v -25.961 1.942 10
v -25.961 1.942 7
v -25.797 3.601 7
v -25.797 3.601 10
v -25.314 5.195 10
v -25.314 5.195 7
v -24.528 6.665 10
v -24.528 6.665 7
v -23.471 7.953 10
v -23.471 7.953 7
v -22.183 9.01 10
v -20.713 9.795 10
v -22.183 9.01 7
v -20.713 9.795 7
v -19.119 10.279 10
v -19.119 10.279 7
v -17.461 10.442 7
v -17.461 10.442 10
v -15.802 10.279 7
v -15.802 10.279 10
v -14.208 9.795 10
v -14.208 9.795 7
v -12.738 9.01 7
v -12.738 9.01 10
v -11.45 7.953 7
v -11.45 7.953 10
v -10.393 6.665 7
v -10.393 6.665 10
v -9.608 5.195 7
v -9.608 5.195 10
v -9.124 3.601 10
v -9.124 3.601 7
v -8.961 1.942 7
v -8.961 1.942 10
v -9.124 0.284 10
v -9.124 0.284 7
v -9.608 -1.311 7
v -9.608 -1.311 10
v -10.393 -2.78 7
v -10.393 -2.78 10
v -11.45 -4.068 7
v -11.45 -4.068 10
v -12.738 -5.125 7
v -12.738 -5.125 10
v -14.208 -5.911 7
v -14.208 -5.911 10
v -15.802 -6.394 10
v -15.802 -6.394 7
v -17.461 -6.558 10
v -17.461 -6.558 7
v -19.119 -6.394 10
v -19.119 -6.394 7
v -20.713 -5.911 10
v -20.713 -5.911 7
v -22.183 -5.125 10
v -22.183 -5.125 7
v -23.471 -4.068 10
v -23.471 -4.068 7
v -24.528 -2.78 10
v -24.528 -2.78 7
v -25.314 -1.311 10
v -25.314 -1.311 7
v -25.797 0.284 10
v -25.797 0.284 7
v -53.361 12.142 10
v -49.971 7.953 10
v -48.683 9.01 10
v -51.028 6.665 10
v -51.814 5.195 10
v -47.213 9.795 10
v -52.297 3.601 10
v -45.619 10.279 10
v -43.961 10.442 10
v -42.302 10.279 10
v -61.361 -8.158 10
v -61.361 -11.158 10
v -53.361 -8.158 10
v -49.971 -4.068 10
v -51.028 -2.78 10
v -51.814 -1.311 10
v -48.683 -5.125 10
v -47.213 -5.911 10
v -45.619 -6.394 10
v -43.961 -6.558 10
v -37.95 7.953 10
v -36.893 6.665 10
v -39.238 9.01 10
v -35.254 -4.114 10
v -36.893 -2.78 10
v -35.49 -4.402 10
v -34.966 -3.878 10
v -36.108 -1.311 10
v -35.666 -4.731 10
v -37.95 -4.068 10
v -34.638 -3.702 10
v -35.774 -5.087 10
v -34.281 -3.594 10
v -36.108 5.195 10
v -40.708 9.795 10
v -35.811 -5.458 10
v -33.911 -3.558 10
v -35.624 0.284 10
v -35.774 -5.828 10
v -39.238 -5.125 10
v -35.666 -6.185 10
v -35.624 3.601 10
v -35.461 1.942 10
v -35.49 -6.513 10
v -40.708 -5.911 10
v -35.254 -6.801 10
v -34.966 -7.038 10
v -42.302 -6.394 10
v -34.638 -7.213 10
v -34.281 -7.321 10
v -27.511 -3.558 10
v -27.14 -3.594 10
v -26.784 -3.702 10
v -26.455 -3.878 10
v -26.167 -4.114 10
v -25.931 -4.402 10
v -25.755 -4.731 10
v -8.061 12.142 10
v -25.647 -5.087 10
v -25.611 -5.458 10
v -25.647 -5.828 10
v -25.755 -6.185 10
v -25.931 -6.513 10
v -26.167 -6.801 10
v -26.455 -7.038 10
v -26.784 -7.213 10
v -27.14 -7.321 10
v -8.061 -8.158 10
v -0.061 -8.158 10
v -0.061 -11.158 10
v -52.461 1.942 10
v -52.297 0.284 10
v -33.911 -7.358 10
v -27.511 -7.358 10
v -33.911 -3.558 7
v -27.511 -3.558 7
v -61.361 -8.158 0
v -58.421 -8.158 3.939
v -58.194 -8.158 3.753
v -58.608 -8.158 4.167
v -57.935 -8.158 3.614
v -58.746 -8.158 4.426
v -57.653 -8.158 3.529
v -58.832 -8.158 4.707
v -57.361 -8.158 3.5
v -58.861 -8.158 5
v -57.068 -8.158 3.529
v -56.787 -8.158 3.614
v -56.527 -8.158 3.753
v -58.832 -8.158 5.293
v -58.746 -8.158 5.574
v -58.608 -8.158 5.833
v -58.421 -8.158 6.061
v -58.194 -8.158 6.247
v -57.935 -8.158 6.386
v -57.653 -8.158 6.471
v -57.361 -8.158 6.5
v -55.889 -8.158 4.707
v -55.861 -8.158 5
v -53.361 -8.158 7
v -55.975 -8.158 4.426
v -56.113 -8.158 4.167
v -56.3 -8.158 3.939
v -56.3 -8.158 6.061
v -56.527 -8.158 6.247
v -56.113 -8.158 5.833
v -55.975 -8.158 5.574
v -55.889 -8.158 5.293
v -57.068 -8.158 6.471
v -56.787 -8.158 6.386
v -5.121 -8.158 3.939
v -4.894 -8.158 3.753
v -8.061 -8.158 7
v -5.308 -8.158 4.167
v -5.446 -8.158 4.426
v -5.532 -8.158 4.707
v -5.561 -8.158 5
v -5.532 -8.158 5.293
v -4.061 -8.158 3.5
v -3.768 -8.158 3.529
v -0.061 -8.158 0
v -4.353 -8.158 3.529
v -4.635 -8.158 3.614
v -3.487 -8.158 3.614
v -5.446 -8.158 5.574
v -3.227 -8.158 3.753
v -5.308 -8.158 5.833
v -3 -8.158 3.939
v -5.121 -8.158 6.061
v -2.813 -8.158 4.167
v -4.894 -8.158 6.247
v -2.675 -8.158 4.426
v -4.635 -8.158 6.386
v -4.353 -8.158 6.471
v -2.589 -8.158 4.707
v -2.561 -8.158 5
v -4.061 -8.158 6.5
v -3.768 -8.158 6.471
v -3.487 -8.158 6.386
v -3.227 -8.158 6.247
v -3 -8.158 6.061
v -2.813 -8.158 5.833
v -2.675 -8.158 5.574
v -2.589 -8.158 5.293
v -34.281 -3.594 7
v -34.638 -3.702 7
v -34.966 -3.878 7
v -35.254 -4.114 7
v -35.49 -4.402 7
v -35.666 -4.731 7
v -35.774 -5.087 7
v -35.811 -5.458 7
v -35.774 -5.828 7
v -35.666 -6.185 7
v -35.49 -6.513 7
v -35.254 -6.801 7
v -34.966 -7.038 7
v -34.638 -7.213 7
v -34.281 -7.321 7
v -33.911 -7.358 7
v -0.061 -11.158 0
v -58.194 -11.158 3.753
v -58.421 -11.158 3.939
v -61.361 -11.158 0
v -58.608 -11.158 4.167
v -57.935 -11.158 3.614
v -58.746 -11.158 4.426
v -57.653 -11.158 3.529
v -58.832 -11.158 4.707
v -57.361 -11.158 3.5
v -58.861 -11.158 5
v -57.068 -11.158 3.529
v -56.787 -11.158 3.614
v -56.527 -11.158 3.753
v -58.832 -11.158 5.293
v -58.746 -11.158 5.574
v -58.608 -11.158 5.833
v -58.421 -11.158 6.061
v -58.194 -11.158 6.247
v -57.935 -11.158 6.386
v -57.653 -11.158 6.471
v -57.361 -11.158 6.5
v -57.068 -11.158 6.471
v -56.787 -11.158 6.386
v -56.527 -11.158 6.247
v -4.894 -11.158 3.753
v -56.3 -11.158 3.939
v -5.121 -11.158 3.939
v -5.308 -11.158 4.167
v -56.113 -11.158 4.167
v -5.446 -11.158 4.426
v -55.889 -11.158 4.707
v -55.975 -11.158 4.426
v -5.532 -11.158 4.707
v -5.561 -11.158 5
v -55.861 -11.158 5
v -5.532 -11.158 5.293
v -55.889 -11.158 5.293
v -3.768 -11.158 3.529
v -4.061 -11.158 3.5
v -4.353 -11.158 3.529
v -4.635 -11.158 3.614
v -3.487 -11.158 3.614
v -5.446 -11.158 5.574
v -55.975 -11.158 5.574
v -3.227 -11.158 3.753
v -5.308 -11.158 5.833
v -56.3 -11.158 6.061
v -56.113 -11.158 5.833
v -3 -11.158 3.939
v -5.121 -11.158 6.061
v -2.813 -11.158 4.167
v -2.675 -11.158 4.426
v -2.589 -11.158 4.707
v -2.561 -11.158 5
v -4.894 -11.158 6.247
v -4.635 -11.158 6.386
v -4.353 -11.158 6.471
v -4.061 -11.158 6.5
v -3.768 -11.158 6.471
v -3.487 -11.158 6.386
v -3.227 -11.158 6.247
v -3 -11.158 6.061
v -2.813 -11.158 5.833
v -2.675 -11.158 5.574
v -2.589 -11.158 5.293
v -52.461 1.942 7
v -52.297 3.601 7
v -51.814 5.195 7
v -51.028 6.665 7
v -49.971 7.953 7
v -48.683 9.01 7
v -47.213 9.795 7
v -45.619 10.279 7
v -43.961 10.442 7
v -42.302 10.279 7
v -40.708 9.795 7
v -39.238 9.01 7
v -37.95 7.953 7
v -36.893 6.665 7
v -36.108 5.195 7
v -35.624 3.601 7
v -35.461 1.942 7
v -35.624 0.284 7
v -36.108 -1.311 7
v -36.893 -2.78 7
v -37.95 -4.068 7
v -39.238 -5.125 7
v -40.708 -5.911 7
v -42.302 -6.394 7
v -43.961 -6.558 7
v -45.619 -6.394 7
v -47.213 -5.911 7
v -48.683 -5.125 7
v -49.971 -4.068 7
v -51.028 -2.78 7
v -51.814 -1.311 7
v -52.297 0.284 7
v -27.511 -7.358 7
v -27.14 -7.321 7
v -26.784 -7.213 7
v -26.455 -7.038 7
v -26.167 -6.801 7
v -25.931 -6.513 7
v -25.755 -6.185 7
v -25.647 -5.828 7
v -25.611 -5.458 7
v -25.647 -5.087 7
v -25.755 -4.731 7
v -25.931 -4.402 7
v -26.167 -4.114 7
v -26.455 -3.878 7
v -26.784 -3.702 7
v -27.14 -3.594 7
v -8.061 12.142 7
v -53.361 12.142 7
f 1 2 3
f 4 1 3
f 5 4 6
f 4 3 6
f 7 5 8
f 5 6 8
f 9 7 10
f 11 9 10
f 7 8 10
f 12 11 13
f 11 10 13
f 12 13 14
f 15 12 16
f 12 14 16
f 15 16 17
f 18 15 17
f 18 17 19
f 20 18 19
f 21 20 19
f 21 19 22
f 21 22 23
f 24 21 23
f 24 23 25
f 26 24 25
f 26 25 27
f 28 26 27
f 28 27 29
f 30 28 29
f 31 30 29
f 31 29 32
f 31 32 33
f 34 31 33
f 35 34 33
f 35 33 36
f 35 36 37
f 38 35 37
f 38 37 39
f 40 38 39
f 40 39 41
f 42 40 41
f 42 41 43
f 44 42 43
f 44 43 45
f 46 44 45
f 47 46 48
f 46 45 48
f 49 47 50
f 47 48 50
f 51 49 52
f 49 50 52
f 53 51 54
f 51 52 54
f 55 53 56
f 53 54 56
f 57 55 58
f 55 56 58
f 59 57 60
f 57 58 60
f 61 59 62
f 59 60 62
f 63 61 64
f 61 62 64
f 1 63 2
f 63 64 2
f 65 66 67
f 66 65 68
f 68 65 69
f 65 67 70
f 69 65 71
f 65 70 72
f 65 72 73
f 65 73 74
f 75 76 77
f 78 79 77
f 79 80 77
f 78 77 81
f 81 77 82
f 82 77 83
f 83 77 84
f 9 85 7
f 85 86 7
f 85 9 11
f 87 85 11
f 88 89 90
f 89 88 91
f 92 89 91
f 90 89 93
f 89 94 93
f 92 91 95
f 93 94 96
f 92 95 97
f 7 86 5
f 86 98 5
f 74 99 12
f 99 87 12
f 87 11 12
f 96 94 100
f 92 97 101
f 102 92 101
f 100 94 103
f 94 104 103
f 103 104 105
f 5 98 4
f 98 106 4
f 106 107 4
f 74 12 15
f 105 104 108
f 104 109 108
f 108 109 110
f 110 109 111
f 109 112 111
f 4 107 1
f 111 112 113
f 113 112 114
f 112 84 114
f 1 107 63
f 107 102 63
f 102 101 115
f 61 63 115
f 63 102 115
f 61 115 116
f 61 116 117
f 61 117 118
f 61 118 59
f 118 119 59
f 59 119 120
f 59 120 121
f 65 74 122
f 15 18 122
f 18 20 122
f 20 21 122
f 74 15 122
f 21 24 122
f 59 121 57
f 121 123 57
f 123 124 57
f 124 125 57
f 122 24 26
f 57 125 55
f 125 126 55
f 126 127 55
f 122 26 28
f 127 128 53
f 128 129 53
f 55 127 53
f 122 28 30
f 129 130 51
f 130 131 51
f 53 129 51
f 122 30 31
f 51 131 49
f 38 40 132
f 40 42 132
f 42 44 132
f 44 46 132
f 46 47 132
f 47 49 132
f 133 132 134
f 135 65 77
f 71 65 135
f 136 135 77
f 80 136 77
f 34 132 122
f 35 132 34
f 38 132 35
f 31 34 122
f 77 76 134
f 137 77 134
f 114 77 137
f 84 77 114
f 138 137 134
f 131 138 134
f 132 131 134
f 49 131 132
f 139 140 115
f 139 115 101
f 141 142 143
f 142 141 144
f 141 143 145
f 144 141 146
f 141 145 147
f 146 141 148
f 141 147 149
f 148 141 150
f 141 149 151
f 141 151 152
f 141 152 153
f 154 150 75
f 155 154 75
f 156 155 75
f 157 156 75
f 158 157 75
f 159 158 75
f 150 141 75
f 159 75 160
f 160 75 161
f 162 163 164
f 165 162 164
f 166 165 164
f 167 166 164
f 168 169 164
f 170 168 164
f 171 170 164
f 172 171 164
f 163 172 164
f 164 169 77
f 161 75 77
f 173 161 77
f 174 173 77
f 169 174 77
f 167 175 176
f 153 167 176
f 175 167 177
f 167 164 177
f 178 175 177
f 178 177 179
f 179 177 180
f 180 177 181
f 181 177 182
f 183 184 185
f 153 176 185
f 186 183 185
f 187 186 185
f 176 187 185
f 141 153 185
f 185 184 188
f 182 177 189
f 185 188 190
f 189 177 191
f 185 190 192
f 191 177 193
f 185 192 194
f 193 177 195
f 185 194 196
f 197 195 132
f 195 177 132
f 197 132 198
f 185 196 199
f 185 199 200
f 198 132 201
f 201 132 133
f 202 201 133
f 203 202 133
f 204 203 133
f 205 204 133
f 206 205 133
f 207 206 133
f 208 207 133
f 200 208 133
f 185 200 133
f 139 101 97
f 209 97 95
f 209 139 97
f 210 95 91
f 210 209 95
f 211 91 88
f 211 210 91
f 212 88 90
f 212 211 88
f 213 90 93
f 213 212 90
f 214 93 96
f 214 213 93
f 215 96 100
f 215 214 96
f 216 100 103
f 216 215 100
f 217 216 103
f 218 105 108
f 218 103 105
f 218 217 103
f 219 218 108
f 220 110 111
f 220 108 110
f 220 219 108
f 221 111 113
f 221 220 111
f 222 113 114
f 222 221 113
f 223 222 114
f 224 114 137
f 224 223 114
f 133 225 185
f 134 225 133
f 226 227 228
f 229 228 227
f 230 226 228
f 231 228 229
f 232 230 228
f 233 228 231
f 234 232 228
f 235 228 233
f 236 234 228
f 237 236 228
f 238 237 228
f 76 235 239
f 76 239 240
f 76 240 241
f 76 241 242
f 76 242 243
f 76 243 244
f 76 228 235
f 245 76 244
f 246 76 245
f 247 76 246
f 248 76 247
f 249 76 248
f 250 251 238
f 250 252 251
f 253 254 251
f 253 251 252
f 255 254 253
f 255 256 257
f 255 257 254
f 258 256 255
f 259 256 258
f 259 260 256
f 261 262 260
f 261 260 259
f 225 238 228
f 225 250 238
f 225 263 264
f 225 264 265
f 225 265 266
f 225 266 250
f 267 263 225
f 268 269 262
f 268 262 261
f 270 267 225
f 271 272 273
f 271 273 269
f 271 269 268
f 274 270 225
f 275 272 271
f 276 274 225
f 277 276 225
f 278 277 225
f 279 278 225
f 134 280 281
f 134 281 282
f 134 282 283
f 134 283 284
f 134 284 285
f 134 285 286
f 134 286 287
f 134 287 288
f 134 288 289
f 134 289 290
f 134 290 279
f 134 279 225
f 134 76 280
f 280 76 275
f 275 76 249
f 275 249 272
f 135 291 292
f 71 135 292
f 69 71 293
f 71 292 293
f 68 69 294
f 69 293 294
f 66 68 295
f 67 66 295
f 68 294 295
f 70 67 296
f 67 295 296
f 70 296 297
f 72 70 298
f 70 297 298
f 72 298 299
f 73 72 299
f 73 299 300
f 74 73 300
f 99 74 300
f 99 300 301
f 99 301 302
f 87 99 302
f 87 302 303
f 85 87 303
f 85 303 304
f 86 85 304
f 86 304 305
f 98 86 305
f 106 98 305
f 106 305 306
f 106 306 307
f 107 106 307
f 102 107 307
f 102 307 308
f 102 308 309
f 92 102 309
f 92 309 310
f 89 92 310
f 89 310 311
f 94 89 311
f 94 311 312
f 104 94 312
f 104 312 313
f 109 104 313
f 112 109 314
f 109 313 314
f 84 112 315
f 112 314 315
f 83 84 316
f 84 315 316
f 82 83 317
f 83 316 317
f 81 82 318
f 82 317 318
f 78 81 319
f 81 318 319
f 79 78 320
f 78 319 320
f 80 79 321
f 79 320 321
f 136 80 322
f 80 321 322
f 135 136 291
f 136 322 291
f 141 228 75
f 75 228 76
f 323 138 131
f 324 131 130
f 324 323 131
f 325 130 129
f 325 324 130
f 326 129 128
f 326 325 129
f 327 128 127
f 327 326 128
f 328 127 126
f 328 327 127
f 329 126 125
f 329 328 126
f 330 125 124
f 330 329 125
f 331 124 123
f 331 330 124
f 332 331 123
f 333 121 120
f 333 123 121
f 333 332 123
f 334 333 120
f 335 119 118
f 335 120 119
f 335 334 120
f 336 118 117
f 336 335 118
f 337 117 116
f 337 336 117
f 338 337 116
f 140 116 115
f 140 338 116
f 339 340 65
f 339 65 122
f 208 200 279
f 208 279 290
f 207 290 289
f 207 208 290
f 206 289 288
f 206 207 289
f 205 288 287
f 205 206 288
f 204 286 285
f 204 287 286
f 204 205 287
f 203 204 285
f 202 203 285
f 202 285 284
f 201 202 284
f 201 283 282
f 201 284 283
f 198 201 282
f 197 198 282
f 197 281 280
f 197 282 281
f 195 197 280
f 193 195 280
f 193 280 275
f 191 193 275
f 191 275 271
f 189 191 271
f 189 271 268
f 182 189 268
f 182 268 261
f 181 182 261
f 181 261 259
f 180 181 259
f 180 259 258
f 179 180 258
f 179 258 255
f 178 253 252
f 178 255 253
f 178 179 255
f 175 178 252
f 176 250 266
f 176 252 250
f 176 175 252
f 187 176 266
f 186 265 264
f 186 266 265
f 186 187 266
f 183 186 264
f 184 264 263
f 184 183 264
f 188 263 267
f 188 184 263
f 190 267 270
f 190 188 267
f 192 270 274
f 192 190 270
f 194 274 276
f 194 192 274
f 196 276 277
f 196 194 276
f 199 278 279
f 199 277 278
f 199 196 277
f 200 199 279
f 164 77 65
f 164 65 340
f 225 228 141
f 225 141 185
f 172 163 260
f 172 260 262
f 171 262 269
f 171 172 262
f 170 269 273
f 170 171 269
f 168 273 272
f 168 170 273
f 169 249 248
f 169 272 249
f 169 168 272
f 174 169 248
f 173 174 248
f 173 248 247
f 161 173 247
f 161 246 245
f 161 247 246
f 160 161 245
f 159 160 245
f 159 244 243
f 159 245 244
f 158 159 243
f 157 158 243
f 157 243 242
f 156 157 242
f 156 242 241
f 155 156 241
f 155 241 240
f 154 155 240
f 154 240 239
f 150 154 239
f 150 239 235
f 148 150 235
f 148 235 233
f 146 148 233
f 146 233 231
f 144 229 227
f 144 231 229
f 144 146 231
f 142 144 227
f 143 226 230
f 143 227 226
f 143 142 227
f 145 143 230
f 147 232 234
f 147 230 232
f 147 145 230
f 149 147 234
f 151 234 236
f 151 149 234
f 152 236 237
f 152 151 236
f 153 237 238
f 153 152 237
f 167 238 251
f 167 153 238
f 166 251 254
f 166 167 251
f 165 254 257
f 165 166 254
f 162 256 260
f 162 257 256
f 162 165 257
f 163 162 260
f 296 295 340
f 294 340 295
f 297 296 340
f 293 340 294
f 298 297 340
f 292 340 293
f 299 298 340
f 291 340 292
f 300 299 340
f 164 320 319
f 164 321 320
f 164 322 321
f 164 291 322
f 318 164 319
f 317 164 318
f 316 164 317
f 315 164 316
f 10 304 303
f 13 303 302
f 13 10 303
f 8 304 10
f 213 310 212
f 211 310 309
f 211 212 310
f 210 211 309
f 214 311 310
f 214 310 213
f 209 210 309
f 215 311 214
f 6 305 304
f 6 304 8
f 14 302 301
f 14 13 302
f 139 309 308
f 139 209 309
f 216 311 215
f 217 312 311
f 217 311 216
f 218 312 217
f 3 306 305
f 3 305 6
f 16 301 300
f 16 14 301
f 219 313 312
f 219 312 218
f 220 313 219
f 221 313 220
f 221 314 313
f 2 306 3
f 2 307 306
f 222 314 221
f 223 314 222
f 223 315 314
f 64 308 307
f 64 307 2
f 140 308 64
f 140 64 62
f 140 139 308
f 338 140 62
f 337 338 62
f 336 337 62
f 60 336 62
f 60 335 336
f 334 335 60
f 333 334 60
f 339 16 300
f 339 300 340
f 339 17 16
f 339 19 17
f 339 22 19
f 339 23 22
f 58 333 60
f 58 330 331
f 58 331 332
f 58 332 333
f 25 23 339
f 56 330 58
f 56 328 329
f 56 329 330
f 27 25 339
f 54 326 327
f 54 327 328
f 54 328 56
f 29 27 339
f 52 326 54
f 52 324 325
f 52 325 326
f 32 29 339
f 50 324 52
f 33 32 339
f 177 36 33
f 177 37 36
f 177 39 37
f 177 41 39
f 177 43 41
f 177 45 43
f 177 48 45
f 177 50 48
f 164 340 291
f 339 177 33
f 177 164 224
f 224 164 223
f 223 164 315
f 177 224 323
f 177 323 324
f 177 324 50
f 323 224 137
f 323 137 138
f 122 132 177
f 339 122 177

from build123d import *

# Parameters (mm, degrees)
SKETCH1_W               = 170
SKETCH1_H               = 3
BOSS_EXTRUDE1_DEPTH     = 10
SKETCH4_R               = 1.2
CUT_EXTRUDE1_DEPTH      = 21
SKETCH2_W               = 45.3
SKETCH2_H               = 3
BOSS_EXTRUDE6_DEPTH     = 20.3
SKETCH5_R               = 8.5
CUT_EXTRUDE2_DEPTH      = 20.3
SKETCH6_W               = 45.3
SKETCH6_H               = 3
BOSS_EXTRUDE7_DEPTH     = 20.3
SKETCH7_R               = 8.5
CUT_EXTRUDE3_DEPTH      = 100.885733504
CUT_EXTRUDE5_DEPTH      = 102.201856693
CUT_EXTRUDE5_DEPTH_BACK = 102.201856693
SKETCH12_W              = 88.7
SKETCH12_H              = 17.241657791
CUT_EXTRUDE6_DEPTH      = 75.862735481
CUT_EXTRUDE6_DEPTH_BACK = 75.862735481
SKETCH13_W              = 37.135878318
SKETCH13_H              = 38.462159687
SKETCH13_W_2            = 38.462159687
SKETCH13_H_2            = 47.746129266
SKETCH15_W              = 8
SKETCH15_H              = 10
BOSS_EXTRUDE9_DEPTH     = 3
CUT_EXTRUDE7_DEPTH      = 67.392895801
CUT_EXTRUDE7_DEPTH_BACK = 67.392895801
SKETCH16_R              = 1.5


with BuildPart() as part:
    # Sketch1 → Boss-Extrude1 (new body)
    with BuildSketch(Plane.XY):
        with Locations((13.639372454, -9.657761352)):
            Rectangle(SKETCH1_W, SKETCH1_H)
    extrude(amount=BOSS_EXTRUDE1_DEPTH)

    # Sketch4 → Cut-Extrude1 (cut)
    with BuildSketch(Plane(origin=(0, -8.157761352, 0), x_dir=(1, 0, 0), z_dir=(0, 1, 0))):
        with Locations(Location((-63.360627546, -4.938536908, 0), (0, 0, 180))):
            Circle(SKETCH4_R)
        with Locations(Location((90.639372454, -5.283238547, 0), (0, 0, 180))):
            Circle(SKETCH4_R)
    extrude(amount=-CUT_EXTRUDE1_DEPTH, mode=Mode.SUBTRACT)

    # Sketch2 → Boss-Extrude6 (add)
    with BuildSketch(Plane(origin=(0, -8.157761352, 0), x_dir=(1, 0, 0), z_dir=(0, 1, 0))):
        with Locations((-30.710627546, -8.5)):
            Rectangle(SKETCH2_W, SKETCH2_H)
    extrude(amount=BOSS_EXTRUDE6_DEPTH)

    # Sketch5 → Cut-Extrude2 (cut)
    with BuildSketch(Plane(origin=(0, 0, 7), x_dir=(-1, 0, 0), z_dir=(0, 0, -1))):
        with Locations((17.460627546, 1.942238648)):
            Circle(SKETCH5_R)
        with Locations((43.960627546, 1.942238648)):
            Circle(SKETCH5_R)
        with BuildLine():
            Line((27.510627546, -3.557761352), (33.910627546, -3.557761352))
            ThreePointArc((33.910627546, -3.557761352), (35.810627546, -5.457761352), (33.910627546, -7.357761352))
            Line((33.910627546, -7.357761352), (27.510627546, -7.357761352))
            ThreePointArc((27.510627546, -7.357761352), (25.610627546, -5.457761352), (27.510627546, -3.557761352))
        make_face()
    extrude(amount=-CUT_EXTRUDE2_DEPTH, mode=Mode.SUBTRACT)

    # Sketch6 → Boss-Extrude7 (add)
    with BuildSketch(Plane(origin=(0, -8.157761352, 0), x_dir=(1, 0, 0), z_dir=(0, 1, 0))):
        with Locations((57.989372454, -8.5)):
            Rectangle(SKETCH6_W, SKETCH6_H)
    extrude(amount=BOSS_EXTRUDE7_DEPTH)

    # Sketch7 → Cut-Extrude3 (cut, through all)
    with BuildSketch(Plane.XY.offset(10)):
        with Locations((44.739372454, 1.942238648)):
            Circle(SKETCH7_R)
        with Locations((71.239372454, 1.942238648)):
            Circle(SKETCH7_R)
        with BuildLine():
            Line((54.839372454, -3.557761352), (61.239372454, -3.557761352))
            ThreePointArc((61.239372454, -3.557761352), (63.139372454, -5.457761352), (61.239372454, -7.357761352))
            Line((61.239372454, -7.357761352), (54.839372454, -7.357761352))
            ThreePointArc((54.839372454, -7.357761352), (52.939372454, -5.457761352), (54.839372454, -3.557761352))
        make_face()
    extrude(amount=-CUT_EXTRUDE3_DEPTH, mode=Mode.SUBTRACT)

    # Sketch12 → Cut-Extrude5 (cut, two sides: drawn at the far end of the back side and taken through both)
    with BuildSketch(Plane(origin=(0, -8.157761352, 0), x_dir=(1, 0, 0), z_dir=(0, 1, 0)).offset(-CUT_EXTRUDE5_DEPTH_BACK)):
        with Locations((54.289372454, -4.61843826)):
            Rectangle(SKETCH12_W, SKETCH12_H)
    extrude(amount=CUT_EXTRUDE5_DEPTH + CUT_EXTRUDE5_DEPTH_BACK, mode=Mode.SUBTRACT)

    # Sketch13 → Cut-Extrude6 (cut, two sides: drawn at the far end of the back side and taken through both)
    with BuildSketch(Plane(origin=(0, -8.157761352, 0), x_dir=(1, 0, 0), z_dir=(0, 1, 0)).offset(-CUT_EXTRUDE6_DEPTH_BACK)):
        with Locations((-71.928566705, 3.983905185)):
            Rectangle(SKETCH13_W, SKETCH13_H)
        with Locations((11.170452297, -17.070811541)):
            Rectangle(SKETCH13_W_2, SKETCH13_H_2)
    extrude(amount=CUT_EXTRUDE6_DEPTH + CUT_EXTRUDE6_DEPTH_BACK, mode=Mode.SUBTRACT)

    # Sketch15 → Boss-Extrude9 (add)
    with BuildSketch(Plane.XZ.offset(11.157761352)):
        with Locations((-57.360627546, 5)):
            Rectangle(SKETCH15_W, SKETCH15_H)
        with Locations((-4.060627546, 5)):
            Rectangle(SKETCH15_W, SKETCH15_H)
    extrude(amount=-BOSS_EXTRUDE9_DEPTH)

    # Sketch16 → Cut-Extrude7 (cut, two sides: drawn at the far end of the back side and taken through both)
    with BuildSketch(Plane(origin=(0, -11.157761352, 0), x_dir=(-1, 0, 0), z_dir=(0, -1, 0)).offset(-CUT_EXTRUDE7_DEPTH_BACK)):
        with Locations(Location((57.360627546, -5, 0), (0, 0, 180))):
            Circle(SKETCH16_R)
        with Locations(Location((4.060627546, -5, 0), (0, 0, 180))):
            Circle(SKETCH16_R)
    extrude(amount=CUT_EXTRUDE7_DEPTH + CUT_EXTRUDE7_DEPTH_BACK, mode=Mode.SUBTRACT)


solid = part.part
